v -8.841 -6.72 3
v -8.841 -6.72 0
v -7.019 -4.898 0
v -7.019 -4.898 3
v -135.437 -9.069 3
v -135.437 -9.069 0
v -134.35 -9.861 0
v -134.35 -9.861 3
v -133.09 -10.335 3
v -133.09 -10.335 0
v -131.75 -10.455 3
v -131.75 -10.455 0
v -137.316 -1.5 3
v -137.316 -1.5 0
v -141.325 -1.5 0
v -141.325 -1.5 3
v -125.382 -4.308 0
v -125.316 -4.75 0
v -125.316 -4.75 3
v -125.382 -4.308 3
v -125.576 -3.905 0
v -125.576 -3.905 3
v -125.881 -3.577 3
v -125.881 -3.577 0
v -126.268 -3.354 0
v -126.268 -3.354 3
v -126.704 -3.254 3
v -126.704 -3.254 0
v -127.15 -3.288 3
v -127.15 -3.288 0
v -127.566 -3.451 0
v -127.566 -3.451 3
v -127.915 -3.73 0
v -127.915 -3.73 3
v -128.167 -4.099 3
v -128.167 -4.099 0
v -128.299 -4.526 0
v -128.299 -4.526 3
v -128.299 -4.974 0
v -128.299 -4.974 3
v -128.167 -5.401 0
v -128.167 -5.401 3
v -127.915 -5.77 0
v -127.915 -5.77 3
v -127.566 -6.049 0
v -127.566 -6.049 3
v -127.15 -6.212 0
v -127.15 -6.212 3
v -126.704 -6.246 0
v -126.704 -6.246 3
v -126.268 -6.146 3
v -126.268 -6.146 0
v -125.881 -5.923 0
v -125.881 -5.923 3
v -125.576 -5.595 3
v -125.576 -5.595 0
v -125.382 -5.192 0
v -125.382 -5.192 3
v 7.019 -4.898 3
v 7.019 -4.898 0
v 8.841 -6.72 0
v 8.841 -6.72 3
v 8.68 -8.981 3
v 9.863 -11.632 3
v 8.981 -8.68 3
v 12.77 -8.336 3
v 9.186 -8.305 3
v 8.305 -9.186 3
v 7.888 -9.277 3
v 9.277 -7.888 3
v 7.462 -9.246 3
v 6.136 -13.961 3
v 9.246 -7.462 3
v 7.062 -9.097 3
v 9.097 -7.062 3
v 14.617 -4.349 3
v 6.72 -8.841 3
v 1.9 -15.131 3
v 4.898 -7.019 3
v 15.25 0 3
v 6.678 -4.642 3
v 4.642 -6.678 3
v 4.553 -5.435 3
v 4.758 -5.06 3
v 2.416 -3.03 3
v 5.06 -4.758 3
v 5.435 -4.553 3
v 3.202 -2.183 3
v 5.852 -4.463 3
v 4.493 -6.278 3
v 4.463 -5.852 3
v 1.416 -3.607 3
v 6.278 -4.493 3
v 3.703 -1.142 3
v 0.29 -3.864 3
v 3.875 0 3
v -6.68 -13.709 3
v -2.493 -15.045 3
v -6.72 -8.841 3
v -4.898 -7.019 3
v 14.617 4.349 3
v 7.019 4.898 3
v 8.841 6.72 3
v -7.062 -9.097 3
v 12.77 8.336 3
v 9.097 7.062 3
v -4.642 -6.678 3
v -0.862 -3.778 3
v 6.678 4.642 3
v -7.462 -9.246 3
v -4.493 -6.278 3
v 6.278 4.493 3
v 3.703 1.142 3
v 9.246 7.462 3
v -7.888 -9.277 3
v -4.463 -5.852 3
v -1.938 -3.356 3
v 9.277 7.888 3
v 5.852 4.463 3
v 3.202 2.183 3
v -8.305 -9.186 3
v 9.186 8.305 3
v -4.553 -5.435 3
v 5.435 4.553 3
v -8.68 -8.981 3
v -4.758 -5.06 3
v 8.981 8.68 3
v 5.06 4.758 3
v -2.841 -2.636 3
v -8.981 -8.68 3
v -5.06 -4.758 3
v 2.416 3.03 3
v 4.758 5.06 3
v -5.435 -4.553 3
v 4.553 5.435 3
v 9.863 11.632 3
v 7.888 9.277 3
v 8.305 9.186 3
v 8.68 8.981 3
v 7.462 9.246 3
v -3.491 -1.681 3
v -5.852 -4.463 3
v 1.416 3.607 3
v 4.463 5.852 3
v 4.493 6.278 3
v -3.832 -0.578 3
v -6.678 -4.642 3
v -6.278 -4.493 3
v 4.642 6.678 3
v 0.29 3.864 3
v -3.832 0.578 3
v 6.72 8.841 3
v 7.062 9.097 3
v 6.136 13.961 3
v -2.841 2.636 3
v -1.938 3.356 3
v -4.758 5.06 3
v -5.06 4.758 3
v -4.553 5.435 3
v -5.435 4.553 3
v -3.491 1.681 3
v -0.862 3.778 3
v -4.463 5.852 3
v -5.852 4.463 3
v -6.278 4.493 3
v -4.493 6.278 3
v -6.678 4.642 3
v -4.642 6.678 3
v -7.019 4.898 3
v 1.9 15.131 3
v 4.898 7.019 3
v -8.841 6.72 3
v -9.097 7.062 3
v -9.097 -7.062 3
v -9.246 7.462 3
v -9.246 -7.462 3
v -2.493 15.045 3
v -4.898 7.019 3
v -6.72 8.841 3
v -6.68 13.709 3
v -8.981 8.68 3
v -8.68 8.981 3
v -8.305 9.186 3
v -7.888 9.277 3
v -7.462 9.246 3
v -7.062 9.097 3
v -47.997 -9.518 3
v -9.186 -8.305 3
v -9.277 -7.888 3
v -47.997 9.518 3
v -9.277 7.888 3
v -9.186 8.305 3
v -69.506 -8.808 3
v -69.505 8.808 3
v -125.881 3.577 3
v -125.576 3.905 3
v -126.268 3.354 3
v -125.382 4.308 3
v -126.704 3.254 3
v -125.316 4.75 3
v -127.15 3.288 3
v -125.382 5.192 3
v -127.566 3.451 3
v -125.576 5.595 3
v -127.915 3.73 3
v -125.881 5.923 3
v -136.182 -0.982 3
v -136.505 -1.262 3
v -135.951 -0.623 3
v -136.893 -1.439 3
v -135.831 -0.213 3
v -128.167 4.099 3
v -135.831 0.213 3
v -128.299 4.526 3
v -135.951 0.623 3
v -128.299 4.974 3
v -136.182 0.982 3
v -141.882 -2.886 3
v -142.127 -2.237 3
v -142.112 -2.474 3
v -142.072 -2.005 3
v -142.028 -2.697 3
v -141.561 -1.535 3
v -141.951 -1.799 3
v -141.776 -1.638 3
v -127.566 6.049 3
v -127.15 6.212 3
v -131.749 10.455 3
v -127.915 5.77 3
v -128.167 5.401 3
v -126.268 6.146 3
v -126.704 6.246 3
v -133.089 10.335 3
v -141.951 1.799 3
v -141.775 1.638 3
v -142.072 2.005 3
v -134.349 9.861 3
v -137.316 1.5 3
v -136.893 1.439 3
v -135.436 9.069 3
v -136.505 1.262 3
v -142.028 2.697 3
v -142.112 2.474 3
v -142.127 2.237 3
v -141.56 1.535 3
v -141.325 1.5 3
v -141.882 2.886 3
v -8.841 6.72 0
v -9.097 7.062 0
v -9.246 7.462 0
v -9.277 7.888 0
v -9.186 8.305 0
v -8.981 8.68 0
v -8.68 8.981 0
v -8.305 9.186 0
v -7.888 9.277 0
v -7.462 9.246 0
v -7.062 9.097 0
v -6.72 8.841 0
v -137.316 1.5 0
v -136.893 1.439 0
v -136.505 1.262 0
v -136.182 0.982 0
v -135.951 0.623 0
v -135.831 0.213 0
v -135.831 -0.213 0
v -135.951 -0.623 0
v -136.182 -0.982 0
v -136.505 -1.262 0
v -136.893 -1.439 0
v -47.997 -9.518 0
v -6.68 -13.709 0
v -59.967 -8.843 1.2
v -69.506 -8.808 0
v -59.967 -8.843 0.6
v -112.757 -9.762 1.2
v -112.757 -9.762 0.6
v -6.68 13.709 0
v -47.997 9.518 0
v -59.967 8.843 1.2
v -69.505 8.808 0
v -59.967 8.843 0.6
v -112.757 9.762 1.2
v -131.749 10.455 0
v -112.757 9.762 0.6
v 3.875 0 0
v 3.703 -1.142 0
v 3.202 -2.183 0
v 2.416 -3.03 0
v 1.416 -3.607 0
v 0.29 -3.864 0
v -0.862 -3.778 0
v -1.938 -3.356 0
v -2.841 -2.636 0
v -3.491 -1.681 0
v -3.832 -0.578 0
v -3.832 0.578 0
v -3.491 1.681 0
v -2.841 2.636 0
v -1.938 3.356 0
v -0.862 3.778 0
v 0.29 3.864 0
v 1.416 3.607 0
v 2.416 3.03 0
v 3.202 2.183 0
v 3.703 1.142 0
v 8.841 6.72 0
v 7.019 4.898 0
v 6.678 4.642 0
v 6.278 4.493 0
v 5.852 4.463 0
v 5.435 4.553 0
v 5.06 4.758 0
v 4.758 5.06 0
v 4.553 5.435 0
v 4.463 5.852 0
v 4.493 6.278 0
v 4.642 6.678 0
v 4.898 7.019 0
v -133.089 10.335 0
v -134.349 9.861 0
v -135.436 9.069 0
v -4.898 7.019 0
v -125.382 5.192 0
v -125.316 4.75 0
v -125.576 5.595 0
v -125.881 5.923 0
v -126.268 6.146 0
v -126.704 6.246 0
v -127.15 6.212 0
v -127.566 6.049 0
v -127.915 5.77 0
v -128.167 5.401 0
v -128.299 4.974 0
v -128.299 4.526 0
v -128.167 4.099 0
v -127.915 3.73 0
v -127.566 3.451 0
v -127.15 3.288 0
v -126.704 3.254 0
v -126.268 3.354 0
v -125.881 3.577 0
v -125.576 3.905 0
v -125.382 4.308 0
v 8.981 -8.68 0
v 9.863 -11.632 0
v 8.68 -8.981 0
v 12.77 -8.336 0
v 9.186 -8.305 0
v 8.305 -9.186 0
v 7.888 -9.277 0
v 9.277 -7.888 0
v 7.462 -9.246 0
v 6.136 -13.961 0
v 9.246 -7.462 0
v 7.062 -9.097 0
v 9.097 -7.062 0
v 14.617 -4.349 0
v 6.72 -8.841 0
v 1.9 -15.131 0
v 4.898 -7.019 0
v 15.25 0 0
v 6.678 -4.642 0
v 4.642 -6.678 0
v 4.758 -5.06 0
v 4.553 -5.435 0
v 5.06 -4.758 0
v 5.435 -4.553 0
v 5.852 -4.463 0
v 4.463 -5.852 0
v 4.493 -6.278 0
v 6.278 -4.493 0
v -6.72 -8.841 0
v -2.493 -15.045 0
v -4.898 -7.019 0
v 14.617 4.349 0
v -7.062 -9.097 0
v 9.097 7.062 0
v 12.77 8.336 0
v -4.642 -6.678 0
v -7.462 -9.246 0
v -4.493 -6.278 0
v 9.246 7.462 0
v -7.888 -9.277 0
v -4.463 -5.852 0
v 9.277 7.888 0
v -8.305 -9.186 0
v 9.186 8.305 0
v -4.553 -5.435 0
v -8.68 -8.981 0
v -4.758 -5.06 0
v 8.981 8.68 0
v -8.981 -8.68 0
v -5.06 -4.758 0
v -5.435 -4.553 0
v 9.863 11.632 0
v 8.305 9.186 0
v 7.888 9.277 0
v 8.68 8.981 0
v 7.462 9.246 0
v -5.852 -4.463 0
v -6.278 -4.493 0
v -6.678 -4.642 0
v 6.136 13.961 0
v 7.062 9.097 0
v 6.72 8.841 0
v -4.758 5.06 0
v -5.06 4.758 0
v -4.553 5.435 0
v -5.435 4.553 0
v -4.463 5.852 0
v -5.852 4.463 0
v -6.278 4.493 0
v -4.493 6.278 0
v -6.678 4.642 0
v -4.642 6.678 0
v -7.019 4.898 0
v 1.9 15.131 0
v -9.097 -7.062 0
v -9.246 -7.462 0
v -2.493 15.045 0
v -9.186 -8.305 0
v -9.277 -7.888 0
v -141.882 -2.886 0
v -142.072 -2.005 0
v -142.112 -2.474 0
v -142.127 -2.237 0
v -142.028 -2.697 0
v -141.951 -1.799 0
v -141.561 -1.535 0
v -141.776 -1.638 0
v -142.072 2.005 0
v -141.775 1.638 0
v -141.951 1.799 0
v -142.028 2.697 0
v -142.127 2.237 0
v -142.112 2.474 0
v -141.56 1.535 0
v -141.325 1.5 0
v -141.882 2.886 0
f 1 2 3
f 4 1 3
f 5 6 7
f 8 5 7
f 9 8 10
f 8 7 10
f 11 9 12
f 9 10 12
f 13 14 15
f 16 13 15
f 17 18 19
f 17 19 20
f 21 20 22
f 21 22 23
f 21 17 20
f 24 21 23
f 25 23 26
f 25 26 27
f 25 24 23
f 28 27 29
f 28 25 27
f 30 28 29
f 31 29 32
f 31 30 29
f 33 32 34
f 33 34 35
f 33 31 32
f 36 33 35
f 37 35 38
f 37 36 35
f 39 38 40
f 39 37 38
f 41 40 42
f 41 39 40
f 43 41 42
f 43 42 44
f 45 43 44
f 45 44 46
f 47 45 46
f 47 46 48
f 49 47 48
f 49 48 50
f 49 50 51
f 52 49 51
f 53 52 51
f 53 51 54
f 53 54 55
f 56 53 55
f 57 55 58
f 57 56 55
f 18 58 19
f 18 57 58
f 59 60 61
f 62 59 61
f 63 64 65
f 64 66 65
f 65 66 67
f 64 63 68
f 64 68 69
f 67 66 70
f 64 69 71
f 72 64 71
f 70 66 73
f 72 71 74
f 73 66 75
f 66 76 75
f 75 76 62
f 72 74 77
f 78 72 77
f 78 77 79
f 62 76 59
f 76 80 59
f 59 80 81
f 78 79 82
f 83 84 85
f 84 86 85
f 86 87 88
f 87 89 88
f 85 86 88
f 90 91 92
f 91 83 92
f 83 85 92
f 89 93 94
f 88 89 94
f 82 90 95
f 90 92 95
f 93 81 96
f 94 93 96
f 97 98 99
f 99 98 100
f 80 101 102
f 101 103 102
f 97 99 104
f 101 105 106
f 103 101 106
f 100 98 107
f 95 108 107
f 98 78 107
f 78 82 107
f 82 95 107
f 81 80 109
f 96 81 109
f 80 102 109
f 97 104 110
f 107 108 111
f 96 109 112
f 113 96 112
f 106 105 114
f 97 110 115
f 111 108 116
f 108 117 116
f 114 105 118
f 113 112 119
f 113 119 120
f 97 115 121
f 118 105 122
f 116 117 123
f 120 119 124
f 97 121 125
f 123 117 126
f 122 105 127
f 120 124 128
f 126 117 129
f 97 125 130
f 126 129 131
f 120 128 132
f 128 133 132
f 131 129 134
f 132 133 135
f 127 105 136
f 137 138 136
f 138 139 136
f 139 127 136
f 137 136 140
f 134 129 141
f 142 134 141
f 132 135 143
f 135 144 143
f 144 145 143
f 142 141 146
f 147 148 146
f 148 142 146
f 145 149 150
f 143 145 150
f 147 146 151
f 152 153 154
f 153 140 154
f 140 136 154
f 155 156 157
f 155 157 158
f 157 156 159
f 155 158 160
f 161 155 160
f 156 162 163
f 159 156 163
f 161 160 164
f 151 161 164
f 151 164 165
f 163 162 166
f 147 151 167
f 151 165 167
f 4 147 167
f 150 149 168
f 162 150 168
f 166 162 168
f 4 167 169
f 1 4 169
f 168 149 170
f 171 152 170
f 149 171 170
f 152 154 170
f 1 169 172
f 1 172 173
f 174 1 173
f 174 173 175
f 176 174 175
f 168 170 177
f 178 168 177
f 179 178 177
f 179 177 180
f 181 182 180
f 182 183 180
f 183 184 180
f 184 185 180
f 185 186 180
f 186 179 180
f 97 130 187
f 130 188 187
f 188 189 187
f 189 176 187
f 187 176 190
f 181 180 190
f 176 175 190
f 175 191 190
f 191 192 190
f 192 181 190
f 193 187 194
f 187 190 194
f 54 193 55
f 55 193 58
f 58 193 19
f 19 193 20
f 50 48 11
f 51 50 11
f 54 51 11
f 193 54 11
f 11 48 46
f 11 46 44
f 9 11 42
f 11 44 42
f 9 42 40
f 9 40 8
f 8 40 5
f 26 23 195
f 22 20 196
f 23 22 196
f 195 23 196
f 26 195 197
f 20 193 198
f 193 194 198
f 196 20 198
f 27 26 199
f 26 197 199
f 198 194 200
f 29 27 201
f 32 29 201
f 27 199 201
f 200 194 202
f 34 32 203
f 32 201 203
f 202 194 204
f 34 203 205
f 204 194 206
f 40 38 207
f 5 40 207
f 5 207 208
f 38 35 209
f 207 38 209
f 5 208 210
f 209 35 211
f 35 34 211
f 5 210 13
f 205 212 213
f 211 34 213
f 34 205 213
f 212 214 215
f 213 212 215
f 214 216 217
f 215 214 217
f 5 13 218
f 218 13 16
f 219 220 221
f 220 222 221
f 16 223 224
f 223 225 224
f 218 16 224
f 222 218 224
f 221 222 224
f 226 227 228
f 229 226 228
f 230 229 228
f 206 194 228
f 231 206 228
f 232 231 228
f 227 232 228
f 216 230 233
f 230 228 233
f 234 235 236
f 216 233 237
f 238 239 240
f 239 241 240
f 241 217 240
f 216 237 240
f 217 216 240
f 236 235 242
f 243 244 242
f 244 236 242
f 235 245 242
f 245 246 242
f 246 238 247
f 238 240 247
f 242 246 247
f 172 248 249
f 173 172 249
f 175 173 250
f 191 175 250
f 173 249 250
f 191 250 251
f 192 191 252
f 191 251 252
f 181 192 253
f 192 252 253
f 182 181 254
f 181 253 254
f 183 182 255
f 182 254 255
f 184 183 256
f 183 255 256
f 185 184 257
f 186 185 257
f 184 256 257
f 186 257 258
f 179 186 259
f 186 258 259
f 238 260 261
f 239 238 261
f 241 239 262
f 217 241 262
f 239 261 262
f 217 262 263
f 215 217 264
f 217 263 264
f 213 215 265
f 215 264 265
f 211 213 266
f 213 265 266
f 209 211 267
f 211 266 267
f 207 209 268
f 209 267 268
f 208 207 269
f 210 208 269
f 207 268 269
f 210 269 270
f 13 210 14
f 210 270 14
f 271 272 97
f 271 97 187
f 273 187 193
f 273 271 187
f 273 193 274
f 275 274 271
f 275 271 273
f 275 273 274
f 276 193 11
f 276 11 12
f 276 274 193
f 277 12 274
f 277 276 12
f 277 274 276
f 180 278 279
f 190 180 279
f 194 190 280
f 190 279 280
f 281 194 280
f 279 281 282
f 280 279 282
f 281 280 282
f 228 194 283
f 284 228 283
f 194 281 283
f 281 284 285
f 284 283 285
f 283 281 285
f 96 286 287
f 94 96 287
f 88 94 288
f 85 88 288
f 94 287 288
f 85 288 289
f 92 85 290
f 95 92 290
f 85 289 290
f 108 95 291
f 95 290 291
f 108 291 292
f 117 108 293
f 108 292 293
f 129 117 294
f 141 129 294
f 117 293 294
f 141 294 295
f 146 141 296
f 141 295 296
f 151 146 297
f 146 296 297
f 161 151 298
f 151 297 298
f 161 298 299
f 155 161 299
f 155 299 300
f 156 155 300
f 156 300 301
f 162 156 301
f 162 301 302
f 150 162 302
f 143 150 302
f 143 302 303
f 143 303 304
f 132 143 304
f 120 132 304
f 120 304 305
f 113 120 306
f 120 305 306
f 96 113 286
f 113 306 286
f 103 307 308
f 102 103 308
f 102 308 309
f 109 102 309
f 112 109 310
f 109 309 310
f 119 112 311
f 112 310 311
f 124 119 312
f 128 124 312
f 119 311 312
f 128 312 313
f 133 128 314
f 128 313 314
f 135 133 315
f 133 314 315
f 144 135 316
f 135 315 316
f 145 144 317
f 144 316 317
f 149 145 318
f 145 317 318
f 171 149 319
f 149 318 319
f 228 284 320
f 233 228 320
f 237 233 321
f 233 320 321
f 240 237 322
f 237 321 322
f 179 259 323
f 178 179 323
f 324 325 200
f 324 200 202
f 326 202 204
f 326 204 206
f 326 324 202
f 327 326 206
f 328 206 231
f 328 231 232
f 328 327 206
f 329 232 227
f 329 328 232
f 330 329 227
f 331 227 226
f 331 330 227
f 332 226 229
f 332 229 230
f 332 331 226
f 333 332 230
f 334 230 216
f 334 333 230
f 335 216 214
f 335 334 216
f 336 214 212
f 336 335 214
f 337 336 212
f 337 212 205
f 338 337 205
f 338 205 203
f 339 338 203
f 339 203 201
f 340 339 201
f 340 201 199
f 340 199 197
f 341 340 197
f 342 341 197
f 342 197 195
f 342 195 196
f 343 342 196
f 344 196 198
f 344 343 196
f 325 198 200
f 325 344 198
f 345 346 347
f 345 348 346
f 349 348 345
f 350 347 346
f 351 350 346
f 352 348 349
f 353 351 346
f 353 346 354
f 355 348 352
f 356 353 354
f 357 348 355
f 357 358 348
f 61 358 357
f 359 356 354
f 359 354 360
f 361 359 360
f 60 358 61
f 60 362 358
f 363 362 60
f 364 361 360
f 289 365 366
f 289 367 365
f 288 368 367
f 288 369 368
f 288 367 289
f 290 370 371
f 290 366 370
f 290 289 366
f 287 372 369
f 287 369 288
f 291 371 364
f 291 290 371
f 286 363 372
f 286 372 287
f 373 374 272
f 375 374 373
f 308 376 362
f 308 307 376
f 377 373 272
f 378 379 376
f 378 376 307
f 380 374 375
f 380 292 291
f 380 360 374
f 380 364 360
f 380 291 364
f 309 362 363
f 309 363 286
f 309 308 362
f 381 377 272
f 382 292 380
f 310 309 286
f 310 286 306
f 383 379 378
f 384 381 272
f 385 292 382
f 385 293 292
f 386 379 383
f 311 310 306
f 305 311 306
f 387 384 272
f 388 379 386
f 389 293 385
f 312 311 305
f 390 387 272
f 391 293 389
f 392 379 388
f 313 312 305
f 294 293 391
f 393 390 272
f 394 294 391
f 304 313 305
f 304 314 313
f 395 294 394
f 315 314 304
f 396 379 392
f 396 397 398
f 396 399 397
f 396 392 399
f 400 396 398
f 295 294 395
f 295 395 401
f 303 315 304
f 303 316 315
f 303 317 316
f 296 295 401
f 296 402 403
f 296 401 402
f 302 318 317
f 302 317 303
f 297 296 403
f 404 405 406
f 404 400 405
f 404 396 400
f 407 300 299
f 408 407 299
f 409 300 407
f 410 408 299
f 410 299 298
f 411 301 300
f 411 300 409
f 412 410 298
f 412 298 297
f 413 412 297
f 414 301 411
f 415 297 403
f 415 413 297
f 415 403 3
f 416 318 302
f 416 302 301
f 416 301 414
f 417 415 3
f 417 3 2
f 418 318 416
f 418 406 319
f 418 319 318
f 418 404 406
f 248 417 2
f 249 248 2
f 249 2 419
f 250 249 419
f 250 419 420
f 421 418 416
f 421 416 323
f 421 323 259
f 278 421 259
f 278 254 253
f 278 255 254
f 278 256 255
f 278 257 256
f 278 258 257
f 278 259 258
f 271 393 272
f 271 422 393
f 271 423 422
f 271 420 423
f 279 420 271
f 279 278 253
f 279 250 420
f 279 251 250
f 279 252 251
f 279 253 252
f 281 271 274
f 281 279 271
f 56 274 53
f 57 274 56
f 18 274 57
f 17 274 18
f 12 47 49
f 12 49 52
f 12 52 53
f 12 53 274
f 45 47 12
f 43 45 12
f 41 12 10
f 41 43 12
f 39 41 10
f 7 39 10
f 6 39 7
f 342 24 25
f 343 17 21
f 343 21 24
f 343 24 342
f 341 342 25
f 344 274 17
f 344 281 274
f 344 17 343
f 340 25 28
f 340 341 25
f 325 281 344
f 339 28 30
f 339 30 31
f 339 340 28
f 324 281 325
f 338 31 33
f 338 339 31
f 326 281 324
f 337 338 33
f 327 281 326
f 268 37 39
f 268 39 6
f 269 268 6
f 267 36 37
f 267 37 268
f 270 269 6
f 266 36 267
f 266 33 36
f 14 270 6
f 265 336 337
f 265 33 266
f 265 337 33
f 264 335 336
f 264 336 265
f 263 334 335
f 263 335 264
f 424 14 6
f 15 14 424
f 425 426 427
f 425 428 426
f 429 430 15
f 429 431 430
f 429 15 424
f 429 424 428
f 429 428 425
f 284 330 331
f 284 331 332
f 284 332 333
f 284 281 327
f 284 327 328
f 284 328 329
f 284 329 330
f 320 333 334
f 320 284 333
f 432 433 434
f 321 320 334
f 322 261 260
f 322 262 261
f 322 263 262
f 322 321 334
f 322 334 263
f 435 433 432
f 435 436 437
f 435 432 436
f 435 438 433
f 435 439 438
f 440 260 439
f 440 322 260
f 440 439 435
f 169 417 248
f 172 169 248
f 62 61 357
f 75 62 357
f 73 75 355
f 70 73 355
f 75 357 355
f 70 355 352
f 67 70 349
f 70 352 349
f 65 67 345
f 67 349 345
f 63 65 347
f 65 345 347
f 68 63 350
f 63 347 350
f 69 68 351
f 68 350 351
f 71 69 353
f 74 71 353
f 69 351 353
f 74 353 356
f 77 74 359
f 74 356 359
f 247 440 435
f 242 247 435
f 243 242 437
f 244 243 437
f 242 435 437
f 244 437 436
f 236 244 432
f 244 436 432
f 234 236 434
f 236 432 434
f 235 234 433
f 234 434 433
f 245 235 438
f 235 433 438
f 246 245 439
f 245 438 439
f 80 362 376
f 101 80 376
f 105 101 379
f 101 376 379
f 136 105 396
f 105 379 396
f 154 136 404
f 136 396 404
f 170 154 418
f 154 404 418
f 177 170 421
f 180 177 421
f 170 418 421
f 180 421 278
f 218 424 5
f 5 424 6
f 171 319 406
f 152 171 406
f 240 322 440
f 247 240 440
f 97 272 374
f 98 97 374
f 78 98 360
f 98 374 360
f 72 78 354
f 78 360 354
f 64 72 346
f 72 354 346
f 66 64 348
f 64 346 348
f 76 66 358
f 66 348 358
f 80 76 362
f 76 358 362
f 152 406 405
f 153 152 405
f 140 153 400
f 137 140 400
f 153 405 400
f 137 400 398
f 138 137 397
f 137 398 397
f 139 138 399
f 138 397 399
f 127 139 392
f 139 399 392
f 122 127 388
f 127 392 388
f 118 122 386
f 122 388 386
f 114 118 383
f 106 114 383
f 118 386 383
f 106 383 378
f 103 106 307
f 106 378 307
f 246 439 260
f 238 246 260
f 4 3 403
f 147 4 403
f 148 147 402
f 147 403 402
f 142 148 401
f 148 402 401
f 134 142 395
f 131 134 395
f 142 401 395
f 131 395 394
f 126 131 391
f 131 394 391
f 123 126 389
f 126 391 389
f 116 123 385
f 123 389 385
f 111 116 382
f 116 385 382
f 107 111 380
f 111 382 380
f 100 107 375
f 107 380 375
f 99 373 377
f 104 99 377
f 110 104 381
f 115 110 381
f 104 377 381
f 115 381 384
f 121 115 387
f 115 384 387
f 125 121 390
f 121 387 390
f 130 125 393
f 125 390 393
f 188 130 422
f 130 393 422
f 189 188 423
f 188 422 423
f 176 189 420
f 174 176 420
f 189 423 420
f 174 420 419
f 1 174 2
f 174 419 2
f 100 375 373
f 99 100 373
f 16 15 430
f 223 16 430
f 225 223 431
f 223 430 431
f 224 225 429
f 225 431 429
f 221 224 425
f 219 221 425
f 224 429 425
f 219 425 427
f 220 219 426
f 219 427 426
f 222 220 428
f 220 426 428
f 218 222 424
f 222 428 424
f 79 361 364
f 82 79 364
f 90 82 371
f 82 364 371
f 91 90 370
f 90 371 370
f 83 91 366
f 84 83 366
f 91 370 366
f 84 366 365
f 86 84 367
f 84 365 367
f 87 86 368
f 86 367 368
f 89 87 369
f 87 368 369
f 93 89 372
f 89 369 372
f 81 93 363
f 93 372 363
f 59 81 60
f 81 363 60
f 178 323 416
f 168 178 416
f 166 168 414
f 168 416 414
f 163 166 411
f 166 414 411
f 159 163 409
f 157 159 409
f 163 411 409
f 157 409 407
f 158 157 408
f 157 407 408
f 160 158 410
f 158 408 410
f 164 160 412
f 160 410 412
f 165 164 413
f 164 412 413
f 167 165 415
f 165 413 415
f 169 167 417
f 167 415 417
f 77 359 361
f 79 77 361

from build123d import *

# Parameters (mm, degrees)
F0_R     = 1.5
F1_DEPTH = 3


with BuildPart() as f1:
    # F0 (on Top) → F1 (new body)
    with BuildSketch(Plane.XY):
        with BuildLine():
            add(Edge.make_bspline(
                [(-6.6800528609, -13.709098941), (-13.6230988968, -12.966112559), (-28.8193966293, -11.35995774), (-60.2323159734, -8.0478026259), (-85.0190153768, -9.5661829277), (-109.9805836112, -9.5257147655), (-126.15485479, -10.2021136613), (-131.7499125902, -10.4552480482)],
                knots=[0, 0, 0, 0, 0.1644519416, 0.3597938043, 0.5352021003, 0.7184076683, 0.848432272, 0.848432272, 0.848432272, 0.848432272], degree=3))
            ThreePointArc((-6.6800528609, -13.709098941), (8.08367781, -12.9312278251), (15.25, 0))
            ThreePointArc((15.25, 0), (8.08367781, 12.9312278251), (-6.6800528609, 13.709098941))
            add(Edge.make_bspline(
                [(-6.6800528609, 13.709098941), (-13.6230988968, 12.966112559), (-28.8193966293, 11.35995774), (-60.2323159734, 8.0478026259), (-85.0190153768, 9.5661829277), (-109.9803350442, 9.5257151685), (-126.1543522734, 10.2020926465), (-131.749284441, 10.4552196292)],
                knots=[0, 0, 0, 0, 0.1644519416, 0.3597938043, 0.5352021003, 0.7184076683, 0.8484274061, 0.8484274061, 0.8484274061, 0.8484274061], degree=3))
            ThreePointArc((-131.749284441, 10.4552196292), (-133.73517656, 10.1403618969), (-135.4364624932, 9.0686674097))
            Line((-135.4364624932, 9.0686674097), (-141.8819995216, 2.8859654139))
            ThreePointArc((-141.8819995216, 2.8859654139), (-142.0716378967, 2.0047030481), (-141.324737254, 1.4999996692))
            Line((-141.324737254, 1.4999996692), (-137.3156530508, 1.4999996692))
            ThreePointArc((-137.3156530508, 1.4999996692), (-135.8156530508, -3.308e-07), (-137.3156530508, -1.5000003308))
            Line((-137.3156530508, -1.5000003308), (-141.3248578726, -1.5000003308))
            ThreePointArc((-141.3248578726, -1.5000003308), (-142.0717522528, -2.0046881347), (-141.8821443687, -2.8859428339))
            Line((-141.8821443687, -2.8859428339), (-135.4372426608, -9.0685515427))
            ThreePointArc((-135.4372426608, -9.0685515427), (-133.7359031159, -10.1403539548), (-131.7499125902, -10.4552480482))
        make_face()
        with Locations((-126.8158406019, -4.75)):
            Circle(F0_R, mode=Mode.SUBTRACT)
        with BuildLine():
            Line((-8.8412747136, -6.7199543701), (-7.019418932, -4.8980985885))
            ThreePointArc((-7.019418932, -4.8980985885), (-4.8980985885, -4.8980985885), (-4.8980985885, -7.019418932))
            Line((-4.8980985885, -7.019418932), (-6.7199543701, -8.8412747136))
            ThreePointArc((-6.7199543701, -8.8412747136), (-8.8412747136, -8.8412747136), (-8.8412747136, -6.7199543701))
        make_face(mode=Mode.SUBTRACT)
        with BuildLine():
            ThreePointArc((4.8980985885, -7.019418932), (4.8980985885, -4.8980985885), (7.019418932, -4.8980985885))
            Line((7.019418932, -4.8980985885), (8.8412747136, -6.7199543701))
            ThreePointArc((8.8412747136, -6.7199543701), (8.8412747136, -8.8412747136), (6.7199543701, -8.8412747136))
            Line((6.7199543701, -8.8412747136), (4.8980985885, -7.019418932))
        make_face(mode=Mode.SUBTRACT)
        with Locations((-126.8158406019, 4.75)):
            Circle(F0_R, mode=Mode.SUBTRACT)
        with BuildLine():
            ThreePointArc((-3.875, 0), (0, 3.875), (3.875, 0))
            ThreePointArc((3.875, 0), (0, -3.875), (-3.875, 0))
        make_face(mode=Mode.SUBTRACT)
        with BuildLine():
            ThreePointArc((-8.8412747136, 6.7199543701), (-8.8412747136, 8.8412747136), (-6.7199543701, 8.8412747136))
            Line((-6.7199543701, 8.8412747136), (-4.8980985885, 7.019418932))
            ThreePointArc((-4.8980985885, 7.019418932), (-4.8980985885, 4.8980985885), (-7.019418932, 4.8980985885))
            Line((-7.019418932, 4.8980985885), (-8.8412747136, 6.7199543701))
        make_face(mode=Mode.SUBTRACT)
        with BuildLine():
            Line((8.8412747136, 6.7199543701), (7.019418932, 4.8980985885))
            ThreePointArc((7.019418932, 4.8980985885), (4.8980985885, 4.8980985885), (4.8980985885, 7.019418932))
            Line((4.8980985885, 7.019418932), (6.7199543701, 8.8412747136))
            ThreePointArc((6.7199543701, 8.8412747136), (8.8412747136, 8.8412747136), (8.8412747136, 6.7199543701))
        make_face(mode=Mode.SUBTRACT)
    extrude(amount=F1_DEPTH)


solid = f1.part
